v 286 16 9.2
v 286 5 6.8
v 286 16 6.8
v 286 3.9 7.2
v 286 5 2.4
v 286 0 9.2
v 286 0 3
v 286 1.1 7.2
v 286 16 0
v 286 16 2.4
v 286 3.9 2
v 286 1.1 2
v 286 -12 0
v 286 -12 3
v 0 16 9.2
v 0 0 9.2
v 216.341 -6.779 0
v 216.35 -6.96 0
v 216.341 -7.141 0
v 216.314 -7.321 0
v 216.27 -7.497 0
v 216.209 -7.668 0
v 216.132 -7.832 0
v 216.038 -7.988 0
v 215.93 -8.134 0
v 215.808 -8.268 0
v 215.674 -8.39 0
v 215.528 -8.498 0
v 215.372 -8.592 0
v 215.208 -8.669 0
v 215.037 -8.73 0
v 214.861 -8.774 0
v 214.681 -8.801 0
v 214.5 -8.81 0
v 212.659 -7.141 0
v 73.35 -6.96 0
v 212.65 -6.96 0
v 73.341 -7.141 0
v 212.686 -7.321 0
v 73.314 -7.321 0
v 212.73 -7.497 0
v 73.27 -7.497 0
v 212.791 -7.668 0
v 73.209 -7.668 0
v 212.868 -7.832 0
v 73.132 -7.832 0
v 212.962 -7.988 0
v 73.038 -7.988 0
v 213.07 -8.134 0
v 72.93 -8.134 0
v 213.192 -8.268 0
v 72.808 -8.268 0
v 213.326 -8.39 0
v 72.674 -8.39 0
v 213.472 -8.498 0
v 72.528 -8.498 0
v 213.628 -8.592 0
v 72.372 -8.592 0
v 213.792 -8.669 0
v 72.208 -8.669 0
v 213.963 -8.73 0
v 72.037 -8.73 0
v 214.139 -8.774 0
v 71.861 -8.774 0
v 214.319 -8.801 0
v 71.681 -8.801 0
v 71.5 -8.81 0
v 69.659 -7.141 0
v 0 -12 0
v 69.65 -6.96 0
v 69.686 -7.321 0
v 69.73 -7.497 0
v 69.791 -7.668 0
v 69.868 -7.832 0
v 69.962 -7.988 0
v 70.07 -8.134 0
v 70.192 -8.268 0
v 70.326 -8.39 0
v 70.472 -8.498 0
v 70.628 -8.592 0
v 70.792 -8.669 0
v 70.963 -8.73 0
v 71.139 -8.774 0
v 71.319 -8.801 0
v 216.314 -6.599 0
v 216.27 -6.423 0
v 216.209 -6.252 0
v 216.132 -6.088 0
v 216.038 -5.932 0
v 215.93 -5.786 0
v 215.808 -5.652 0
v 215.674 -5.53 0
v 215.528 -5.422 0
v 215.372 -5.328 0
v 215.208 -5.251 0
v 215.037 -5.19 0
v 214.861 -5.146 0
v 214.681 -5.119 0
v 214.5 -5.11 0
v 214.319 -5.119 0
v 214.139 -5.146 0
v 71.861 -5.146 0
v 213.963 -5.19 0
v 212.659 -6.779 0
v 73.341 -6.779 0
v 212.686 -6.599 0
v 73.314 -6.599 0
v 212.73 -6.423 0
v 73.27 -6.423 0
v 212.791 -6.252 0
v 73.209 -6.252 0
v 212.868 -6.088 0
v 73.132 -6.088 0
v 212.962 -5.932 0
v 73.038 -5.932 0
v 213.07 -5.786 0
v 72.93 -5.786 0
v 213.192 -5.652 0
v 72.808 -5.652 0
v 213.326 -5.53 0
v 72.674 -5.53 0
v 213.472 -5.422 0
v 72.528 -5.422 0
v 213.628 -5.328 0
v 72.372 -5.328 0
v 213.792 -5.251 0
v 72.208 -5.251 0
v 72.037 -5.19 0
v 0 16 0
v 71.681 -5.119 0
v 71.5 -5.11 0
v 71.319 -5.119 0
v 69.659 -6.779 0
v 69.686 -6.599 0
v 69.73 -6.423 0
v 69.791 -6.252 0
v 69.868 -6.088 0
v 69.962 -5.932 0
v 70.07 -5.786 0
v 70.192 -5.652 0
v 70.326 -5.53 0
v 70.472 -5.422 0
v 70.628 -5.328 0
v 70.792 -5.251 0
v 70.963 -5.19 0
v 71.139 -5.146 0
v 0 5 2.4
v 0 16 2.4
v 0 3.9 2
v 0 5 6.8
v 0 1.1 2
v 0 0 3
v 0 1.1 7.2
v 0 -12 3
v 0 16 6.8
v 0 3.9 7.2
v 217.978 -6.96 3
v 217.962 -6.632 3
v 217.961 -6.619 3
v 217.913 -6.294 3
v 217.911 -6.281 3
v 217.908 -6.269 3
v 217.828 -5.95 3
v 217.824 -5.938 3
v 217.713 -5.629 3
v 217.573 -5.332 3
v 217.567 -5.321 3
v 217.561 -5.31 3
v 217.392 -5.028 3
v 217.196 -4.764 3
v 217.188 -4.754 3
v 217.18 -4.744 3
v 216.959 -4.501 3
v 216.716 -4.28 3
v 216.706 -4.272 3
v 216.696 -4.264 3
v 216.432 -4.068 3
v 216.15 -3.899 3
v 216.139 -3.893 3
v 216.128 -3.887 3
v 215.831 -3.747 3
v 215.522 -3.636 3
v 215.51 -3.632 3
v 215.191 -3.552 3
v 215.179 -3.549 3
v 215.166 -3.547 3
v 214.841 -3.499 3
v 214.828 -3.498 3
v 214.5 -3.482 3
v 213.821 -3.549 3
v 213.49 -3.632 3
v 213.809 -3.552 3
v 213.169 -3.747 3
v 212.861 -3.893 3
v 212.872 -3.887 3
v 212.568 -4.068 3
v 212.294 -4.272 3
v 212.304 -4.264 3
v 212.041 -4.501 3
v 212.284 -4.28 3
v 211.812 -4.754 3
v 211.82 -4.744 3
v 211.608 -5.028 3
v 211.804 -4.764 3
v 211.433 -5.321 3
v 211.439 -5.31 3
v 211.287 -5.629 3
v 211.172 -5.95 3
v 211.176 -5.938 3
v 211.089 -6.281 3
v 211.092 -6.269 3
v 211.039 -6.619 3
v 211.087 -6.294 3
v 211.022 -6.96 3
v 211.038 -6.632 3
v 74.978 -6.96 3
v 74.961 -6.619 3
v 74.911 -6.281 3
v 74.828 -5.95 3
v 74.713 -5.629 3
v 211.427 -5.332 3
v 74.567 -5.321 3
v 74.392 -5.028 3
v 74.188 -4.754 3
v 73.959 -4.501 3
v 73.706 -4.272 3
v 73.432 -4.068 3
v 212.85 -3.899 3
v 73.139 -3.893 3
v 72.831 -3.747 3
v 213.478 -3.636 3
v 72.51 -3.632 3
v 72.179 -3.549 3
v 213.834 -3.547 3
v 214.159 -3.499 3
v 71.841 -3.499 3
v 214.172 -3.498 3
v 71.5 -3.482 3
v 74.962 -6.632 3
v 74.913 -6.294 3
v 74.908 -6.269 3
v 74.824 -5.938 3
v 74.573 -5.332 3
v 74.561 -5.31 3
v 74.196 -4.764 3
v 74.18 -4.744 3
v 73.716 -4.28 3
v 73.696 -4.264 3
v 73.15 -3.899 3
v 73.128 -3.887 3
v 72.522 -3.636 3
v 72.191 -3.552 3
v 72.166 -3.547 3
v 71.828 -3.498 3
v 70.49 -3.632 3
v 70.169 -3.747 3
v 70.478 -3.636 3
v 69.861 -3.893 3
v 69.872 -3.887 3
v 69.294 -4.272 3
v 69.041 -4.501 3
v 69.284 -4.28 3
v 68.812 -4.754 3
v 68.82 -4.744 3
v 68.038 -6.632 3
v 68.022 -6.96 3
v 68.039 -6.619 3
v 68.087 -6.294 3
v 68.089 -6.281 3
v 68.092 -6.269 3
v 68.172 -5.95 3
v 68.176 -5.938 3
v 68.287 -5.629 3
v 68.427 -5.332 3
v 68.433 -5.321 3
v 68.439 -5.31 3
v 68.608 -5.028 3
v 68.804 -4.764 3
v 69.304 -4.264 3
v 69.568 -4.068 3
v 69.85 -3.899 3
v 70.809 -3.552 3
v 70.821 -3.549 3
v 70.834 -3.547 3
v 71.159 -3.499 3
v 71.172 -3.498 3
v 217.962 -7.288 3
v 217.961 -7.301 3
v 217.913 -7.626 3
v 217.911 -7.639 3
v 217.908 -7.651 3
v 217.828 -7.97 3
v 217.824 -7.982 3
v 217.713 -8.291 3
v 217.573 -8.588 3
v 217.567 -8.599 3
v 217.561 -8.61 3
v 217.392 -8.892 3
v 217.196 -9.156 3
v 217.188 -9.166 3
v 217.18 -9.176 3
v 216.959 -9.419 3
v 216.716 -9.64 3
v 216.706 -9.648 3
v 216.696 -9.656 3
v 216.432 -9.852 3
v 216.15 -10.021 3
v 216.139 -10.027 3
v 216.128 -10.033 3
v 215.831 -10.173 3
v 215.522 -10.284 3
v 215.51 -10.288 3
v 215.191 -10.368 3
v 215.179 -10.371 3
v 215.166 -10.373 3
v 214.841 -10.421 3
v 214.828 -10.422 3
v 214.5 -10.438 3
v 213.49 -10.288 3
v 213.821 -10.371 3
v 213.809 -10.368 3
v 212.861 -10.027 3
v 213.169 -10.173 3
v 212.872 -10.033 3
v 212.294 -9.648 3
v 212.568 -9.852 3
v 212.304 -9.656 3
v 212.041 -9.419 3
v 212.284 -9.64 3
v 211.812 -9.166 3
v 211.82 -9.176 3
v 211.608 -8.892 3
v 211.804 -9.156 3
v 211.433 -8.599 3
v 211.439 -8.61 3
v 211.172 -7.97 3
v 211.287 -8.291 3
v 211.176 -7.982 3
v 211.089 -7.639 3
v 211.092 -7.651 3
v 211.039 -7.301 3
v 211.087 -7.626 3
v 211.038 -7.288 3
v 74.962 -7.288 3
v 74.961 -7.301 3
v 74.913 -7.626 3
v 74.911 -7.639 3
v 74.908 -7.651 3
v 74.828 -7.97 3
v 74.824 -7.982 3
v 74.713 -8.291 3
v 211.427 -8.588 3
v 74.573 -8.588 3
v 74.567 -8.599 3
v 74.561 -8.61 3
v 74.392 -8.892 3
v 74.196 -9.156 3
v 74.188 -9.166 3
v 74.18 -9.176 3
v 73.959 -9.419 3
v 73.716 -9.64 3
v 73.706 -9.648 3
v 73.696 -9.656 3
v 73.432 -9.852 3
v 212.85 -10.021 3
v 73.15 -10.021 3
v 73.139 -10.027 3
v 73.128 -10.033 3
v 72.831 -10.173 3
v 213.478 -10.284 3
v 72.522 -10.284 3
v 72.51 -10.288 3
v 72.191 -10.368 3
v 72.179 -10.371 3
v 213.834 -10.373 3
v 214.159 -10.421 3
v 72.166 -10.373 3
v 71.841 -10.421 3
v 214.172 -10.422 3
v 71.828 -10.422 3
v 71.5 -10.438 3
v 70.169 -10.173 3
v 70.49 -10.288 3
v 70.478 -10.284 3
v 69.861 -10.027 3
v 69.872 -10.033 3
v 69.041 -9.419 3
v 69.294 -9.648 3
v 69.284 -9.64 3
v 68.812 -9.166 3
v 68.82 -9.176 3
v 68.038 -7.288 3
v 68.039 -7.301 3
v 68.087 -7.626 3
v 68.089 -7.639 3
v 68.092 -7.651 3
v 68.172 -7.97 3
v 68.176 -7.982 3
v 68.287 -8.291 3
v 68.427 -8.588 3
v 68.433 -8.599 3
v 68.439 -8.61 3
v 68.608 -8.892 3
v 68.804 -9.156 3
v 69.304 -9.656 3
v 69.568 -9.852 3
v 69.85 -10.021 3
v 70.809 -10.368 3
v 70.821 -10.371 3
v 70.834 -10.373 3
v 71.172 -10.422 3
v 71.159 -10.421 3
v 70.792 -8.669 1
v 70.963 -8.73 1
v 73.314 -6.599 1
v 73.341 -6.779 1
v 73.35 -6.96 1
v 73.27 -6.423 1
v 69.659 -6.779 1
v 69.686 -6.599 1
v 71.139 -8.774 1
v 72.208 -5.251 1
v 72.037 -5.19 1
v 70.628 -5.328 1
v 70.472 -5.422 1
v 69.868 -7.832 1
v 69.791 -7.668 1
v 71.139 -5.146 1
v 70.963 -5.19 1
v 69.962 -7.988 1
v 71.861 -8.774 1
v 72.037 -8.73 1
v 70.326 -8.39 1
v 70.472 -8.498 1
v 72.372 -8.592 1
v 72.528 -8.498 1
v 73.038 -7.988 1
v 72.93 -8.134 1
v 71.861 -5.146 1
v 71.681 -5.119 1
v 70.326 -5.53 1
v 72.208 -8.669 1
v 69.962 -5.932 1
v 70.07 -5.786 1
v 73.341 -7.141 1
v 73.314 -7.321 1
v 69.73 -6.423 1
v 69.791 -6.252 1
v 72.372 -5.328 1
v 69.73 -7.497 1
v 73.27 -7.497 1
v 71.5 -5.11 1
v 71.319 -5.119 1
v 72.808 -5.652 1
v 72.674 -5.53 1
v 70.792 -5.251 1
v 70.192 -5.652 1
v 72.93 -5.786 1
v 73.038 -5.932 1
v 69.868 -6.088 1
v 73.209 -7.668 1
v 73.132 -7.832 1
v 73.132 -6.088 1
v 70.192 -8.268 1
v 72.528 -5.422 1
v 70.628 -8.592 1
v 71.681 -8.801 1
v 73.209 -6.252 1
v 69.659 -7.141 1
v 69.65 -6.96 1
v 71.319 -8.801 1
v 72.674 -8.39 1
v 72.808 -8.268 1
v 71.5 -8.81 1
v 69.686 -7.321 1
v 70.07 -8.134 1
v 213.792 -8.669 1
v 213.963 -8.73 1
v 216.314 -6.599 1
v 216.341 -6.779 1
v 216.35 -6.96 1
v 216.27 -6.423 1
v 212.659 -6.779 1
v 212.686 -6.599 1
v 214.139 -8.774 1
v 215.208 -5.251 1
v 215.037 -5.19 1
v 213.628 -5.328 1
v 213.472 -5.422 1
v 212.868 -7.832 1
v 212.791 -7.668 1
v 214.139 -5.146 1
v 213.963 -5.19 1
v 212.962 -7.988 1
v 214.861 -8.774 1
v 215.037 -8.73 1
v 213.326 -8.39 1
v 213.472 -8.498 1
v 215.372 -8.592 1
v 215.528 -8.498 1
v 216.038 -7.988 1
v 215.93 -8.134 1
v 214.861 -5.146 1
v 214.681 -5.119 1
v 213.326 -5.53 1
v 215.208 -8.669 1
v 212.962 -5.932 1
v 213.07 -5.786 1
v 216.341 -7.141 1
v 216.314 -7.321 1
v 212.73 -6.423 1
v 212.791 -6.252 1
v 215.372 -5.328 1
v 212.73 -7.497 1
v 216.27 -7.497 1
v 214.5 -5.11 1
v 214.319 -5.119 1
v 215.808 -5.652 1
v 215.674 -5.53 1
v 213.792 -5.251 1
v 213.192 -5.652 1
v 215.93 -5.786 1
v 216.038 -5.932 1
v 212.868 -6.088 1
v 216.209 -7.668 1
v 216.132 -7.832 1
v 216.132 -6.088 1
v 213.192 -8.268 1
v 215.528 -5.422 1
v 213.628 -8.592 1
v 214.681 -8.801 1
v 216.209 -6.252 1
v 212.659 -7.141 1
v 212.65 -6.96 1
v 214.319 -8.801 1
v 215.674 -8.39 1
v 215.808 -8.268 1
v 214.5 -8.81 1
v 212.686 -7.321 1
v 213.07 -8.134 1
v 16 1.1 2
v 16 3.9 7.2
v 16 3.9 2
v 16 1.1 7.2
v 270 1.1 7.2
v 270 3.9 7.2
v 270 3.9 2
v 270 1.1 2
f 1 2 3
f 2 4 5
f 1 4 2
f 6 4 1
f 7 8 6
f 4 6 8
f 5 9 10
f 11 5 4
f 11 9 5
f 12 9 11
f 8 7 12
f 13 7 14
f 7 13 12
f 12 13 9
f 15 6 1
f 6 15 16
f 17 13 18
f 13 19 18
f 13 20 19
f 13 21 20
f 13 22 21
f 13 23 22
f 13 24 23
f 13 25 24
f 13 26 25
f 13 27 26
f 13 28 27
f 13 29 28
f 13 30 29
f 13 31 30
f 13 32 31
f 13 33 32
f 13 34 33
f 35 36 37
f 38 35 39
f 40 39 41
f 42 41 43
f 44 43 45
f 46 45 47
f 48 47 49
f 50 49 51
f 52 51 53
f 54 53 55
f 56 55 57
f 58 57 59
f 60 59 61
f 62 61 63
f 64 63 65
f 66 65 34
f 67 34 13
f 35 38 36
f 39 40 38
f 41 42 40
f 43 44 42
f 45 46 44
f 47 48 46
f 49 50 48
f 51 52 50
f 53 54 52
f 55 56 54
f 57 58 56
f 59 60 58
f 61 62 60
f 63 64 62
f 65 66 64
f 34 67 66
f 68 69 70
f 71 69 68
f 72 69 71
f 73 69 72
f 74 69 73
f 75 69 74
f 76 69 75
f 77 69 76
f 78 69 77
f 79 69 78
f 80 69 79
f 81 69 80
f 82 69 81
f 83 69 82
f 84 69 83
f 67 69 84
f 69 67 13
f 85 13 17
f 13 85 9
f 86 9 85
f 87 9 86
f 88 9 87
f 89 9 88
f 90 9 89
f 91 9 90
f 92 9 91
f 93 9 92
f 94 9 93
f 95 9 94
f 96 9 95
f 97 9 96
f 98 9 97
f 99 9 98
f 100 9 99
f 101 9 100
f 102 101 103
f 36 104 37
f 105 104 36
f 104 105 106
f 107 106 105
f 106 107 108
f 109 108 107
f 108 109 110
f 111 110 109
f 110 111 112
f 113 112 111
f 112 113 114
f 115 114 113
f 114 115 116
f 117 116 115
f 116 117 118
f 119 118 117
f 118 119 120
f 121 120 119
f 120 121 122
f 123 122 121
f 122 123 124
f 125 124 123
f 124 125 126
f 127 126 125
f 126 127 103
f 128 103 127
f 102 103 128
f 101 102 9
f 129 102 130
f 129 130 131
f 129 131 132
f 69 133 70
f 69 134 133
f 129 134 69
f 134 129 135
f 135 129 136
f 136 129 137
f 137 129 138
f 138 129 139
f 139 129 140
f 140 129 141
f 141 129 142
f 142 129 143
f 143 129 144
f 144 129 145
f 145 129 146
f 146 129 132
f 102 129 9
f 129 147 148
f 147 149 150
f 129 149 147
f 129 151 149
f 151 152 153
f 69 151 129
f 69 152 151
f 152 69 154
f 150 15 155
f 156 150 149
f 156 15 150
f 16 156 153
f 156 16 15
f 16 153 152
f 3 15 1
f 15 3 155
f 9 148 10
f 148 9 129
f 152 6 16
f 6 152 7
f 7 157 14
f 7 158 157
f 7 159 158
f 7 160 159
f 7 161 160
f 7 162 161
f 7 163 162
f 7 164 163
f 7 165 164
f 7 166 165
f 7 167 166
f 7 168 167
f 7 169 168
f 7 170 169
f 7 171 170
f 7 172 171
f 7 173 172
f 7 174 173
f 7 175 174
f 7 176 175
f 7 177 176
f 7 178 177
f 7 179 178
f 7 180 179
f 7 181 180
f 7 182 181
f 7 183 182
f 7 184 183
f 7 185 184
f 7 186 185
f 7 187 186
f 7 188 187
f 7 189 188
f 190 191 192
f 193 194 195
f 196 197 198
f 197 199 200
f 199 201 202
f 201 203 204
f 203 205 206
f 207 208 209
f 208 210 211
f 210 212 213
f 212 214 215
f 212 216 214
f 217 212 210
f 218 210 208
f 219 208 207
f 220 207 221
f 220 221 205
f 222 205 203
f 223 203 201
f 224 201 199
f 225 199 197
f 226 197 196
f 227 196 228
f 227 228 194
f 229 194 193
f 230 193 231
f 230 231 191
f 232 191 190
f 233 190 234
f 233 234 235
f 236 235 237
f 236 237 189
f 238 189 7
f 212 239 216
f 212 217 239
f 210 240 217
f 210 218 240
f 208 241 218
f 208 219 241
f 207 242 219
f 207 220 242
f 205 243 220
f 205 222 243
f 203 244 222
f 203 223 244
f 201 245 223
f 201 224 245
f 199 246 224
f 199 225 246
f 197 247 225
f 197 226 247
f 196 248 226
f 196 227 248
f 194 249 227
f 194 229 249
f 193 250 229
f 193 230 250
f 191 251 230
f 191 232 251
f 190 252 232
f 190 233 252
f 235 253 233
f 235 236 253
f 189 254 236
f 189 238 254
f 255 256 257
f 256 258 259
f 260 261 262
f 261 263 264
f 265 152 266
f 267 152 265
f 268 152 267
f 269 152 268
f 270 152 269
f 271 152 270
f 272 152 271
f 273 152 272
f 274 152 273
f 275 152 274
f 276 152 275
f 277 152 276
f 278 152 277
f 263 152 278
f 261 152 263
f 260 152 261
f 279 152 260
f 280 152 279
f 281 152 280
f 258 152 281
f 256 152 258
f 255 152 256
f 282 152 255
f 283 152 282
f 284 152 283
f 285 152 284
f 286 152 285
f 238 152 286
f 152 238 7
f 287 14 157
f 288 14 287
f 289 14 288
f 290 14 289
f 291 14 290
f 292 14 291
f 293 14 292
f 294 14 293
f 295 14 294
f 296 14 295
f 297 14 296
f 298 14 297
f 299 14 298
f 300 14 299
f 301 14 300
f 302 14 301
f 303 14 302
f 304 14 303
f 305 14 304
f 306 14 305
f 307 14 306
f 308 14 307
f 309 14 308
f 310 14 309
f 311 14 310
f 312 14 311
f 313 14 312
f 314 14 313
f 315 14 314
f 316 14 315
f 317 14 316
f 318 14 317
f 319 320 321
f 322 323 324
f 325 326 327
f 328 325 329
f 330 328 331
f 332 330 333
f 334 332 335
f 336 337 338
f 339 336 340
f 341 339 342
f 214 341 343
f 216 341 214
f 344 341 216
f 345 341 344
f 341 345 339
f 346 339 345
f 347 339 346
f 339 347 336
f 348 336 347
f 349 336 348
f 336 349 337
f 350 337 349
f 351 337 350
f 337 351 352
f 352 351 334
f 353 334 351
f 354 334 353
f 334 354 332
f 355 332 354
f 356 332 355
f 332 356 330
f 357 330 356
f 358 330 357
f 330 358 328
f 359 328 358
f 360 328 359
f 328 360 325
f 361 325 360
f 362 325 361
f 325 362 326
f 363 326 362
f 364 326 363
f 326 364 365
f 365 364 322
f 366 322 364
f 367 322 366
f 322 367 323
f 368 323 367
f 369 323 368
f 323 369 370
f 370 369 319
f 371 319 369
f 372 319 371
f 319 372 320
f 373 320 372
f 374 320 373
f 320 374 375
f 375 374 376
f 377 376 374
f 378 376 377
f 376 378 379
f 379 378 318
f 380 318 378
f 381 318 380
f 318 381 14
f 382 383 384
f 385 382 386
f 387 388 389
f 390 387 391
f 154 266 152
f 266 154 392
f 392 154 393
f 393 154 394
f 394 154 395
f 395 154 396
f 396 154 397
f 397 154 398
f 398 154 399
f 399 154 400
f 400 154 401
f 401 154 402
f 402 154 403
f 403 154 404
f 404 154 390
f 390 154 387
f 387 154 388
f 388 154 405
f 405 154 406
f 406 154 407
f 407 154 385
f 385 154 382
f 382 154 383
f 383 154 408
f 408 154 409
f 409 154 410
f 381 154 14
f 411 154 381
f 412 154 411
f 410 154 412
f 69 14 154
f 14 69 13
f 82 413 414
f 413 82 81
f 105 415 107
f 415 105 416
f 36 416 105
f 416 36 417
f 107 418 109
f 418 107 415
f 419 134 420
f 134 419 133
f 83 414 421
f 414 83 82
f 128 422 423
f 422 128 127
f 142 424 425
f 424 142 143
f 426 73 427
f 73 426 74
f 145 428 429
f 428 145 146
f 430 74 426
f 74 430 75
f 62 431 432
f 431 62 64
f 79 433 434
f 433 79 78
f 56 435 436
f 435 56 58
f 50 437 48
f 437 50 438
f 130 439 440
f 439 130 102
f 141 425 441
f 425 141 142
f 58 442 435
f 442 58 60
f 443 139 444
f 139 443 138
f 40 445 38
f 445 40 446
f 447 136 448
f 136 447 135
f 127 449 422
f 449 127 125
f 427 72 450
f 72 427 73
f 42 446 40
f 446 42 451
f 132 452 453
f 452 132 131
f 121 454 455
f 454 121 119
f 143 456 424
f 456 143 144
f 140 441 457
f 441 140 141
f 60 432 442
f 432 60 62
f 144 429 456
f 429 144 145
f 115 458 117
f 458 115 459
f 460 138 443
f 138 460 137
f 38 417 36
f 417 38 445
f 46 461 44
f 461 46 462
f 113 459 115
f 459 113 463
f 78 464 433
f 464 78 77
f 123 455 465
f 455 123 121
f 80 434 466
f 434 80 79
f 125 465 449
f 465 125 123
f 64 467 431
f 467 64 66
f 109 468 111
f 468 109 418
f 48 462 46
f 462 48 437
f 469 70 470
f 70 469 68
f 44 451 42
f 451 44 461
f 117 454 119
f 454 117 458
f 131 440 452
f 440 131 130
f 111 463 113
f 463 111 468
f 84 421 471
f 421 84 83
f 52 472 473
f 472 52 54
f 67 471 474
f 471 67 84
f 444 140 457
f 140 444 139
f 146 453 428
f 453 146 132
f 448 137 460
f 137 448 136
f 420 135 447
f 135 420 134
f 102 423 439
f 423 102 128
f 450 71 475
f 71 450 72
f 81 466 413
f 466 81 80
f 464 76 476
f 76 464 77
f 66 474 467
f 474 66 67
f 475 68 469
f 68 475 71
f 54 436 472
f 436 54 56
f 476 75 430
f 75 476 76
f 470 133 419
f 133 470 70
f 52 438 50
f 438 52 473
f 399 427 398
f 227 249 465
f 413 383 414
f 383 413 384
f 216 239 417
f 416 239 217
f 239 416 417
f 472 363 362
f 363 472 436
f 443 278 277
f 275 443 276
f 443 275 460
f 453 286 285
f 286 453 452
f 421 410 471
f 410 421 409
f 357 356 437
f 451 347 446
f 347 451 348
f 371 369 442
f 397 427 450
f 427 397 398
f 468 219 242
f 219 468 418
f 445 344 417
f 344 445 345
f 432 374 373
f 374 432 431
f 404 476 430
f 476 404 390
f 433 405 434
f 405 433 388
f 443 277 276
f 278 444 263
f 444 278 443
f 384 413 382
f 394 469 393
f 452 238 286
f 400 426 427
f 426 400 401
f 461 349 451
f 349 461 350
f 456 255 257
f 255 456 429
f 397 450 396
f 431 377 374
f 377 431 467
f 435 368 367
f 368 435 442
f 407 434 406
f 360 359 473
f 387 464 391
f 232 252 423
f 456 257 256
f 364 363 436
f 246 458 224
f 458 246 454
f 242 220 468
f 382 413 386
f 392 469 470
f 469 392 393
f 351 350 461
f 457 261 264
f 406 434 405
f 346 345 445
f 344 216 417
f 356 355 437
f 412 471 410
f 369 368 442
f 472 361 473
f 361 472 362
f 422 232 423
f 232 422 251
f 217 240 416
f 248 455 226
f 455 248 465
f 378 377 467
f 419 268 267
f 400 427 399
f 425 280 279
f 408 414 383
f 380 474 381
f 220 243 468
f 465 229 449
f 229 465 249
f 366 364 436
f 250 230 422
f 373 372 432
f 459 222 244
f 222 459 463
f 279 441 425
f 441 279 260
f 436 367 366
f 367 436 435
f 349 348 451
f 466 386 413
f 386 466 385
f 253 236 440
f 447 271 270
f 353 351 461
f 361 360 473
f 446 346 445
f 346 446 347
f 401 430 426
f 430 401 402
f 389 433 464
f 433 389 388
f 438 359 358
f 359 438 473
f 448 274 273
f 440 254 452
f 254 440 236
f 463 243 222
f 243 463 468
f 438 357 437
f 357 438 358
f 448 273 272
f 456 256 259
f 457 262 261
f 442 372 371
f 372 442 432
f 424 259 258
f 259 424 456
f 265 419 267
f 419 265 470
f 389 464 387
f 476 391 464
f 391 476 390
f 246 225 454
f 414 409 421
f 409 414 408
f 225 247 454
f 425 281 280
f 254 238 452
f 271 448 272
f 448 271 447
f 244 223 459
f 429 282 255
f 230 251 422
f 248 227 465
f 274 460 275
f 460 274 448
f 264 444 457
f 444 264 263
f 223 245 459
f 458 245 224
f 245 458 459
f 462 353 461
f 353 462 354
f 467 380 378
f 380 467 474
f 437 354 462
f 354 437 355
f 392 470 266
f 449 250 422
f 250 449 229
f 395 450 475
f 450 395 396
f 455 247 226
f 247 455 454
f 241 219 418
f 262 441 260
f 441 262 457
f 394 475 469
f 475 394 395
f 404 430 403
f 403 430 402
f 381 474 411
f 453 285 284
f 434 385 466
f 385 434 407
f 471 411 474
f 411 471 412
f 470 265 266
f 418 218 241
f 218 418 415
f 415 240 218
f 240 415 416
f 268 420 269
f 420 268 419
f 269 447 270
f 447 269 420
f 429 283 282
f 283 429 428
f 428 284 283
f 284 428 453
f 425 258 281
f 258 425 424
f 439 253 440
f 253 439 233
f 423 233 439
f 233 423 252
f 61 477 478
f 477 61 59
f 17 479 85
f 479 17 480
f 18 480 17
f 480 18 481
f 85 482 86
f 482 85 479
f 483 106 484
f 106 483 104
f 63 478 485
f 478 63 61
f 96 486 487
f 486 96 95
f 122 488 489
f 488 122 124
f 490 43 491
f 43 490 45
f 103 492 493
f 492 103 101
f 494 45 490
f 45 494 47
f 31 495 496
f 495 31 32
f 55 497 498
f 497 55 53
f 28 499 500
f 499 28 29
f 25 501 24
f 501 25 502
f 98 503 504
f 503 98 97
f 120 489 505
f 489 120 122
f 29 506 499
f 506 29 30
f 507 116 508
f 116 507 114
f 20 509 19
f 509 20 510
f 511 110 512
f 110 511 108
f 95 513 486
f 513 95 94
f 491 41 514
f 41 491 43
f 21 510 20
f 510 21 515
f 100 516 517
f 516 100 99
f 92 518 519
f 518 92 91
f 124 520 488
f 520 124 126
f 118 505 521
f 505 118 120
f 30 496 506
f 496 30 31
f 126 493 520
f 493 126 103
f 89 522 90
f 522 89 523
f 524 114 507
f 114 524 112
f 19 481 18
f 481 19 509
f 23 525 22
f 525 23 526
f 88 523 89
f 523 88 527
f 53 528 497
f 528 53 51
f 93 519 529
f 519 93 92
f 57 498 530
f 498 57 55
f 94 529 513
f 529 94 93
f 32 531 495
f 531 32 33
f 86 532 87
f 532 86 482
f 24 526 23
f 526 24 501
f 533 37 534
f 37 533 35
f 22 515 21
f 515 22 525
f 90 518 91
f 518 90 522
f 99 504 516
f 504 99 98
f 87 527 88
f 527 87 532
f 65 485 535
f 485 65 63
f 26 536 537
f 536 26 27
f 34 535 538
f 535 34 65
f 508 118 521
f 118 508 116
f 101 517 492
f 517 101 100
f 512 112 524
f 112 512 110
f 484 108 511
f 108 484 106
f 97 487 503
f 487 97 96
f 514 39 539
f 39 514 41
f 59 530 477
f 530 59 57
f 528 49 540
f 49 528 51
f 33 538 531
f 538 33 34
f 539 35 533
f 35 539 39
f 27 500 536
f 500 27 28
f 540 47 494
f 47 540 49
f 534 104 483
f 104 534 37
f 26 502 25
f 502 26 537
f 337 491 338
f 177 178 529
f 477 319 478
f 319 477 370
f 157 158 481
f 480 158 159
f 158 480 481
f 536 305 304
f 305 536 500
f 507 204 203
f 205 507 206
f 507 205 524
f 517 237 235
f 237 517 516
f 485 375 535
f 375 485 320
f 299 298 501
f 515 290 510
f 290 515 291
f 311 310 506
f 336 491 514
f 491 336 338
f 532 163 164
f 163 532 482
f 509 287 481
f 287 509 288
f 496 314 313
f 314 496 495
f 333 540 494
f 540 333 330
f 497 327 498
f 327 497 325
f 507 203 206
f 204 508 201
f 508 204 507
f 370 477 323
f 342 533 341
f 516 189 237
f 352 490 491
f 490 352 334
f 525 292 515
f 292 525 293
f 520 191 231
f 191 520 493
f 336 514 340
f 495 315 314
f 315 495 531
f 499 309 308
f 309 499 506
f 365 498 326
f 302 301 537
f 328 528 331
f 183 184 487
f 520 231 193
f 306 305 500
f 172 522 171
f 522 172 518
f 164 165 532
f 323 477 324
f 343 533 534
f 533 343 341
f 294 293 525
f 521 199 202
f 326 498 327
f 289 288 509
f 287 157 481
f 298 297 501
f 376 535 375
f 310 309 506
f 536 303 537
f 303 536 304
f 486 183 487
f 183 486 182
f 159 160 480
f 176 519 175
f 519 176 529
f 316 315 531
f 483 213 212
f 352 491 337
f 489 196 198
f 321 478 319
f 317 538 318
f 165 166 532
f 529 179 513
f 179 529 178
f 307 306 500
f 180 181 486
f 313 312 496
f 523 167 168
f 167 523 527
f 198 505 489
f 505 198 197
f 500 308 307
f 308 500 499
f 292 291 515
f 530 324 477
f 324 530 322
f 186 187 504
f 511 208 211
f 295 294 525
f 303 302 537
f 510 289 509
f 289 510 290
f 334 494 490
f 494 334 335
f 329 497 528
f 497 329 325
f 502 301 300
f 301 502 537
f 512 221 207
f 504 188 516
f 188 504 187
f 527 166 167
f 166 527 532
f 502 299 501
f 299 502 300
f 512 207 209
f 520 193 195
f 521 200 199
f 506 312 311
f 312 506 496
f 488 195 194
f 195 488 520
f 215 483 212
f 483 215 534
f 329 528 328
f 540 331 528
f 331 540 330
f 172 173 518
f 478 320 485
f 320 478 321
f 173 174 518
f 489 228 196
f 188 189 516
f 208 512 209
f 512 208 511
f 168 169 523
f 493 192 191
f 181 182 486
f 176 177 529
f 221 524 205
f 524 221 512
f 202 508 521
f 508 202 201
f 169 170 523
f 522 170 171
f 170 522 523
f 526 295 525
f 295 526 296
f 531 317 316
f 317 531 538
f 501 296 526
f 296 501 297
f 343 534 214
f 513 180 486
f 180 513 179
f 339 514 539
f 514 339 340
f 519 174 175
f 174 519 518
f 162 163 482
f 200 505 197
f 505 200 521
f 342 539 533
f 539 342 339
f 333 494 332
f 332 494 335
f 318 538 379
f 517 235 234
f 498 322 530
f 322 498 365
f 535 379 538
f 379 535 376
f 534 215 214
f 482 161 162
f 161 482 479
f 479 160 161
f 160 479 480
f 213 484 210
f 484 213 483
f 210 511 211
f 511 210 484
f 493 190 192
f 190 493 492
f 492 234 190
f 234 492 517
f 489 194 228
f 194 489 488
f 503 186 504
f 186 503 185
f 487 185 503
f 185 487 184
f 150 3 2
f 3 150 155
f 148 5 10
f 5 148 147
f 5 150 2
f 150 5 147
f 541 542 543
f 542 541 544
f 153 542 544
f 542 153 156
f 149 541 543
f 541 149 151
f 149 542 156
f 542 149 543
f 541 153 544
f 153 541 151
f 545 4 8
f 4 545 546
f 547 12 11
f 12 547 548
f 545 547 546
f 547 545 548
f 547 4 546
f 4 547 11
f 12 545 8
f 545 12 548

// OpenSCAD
/*
 Anycubic Kobra 3 Max – parametric camera-whitebox enclosure hardware
 Hybrid construction: 20x20 mm timber battens, white hardboard and sheet goods.
 Default outer dimensions: 900 x 1050 x 900 mm (W x D x H).
 The camera parts are an independent reconstruction from documented interface
 dimensions. No supplier or legacy mesh is imported by this source.
 License: CC BY 4.0.
*/

PART = is_undef(PART) ? "rail_286" : PART;
ENC_W = is_undef(ENC_W) ? 900 : ENC_W;
ENC_D = is_undef(ENC_D) ? 1050 : ENC_D;
ENC_H = is_undef(ENC_H) ? 900 : ENC_H;
BATTEN = is_undef(BATTEN) ? 20 : BATTEN;
GLASS = is_undef(GLASS) ? 4.0 : GLASS;
GLASS_CLEARANCE = is_undef(GLASS_CLEARANCE) ? 0.40 : GLASS_CLEARANCE;
CAMERA_RAIL_W = is_undef(CAMERA_RAIL_W) ? 20.0 : CAMERA_RAIL_W;
CAMERA_ARM_EYE_T = is_undef(CAMERA_ARM_EYE_T) ? 6.0 : CAMERA_ARM_EYE_T;
CAMERA_HINGE_CLEARANCE = is_undef(CAMERA_HINGE_CLEARANCE) ? 0.65 : CAMERA_HINGE_CLEARANCE;
CAMERA_HINGE_D = is_undef(CAMERA_HINGE_D) ? 4.5 : CAMERA_HINGE_D;
BAFFLE_DEPTH = is_undef(BAFFLE_DEPTH) ? 60.0 : BAFFLE_DEPTH;
CAMERA_FACE_W = is_undef(CAMERA_FACE_W) ? 22.50 : CAMERA_FACE_W;
CAMERA_FACE_H = is_undef(CAMERA_FACE_H) ? 38.50 : CAMERA_FACE_H;
CAMERA_REFERENCE_FULL_H = is_undef(CAMERA_REFERENCE_FULL_H) ? 43.50 : CAMERA_REFERENCE_FULL_H;
CAMERA_REFERENCE_DEPTH = is_undef(CAMERA_REFERENCE_DEPTH) ? 25.00 : CAMERA_REFERENCE_DEPTH;
CAMERA_PROTECTED_DEPTH = is_undef(CAMERA_PROTECTED_DEPTH) ? 25.30 : CAMERA_PROTECTED_DEPTH;
CAMERA_FIT_CLEARANCE = is_undef(CAMERA_FIT_CLEARANCE) ? 0.30 : CAMERA_FIT_CLEARANCE;
CAMERA_LENS_D = is_undef(CAMERA_LENS_D) ? 14.30 : CAMERA_LENS_D;
CAMERA_LED_D = is_undef(CAMERA_LED_D) ? 5.50 : CAMERA_LED_D;
CAMERA_BALL_D = is_undef(CAMERA_BALL_D) ? 11.00 : CAMERA_BALL_D;
CAMERA_BALL_CLEARANCE = is_undef(CAMERA_BALL_CLEARANCE) ? 0.28 : CAMERA_BALL_CLEARANCE;
CAMERA_WINDOW_W = is_undef(CAMERA_WINDOW_W) ? 80.0 : CAMERA_WINDOW_W;
CAMERA_WINDOW_H = is_undef(CAMERA_WINDOW_H) ? 90.0 : CAMERA_WINDOW_H;
CAMERA_WINDOW_TILT = is_undef(CAMERA_WINDOW_TILT) ? 7.0 : CAMERA_WINDOW_TILT;

RAIL_REACH = 16.0;
RAIL_BACK = 5.0;
RAIL_SLOT_DEPTH = RAIL_REACH - RAIL_BACK;
RAIL_WALL = 2.4;
RAIL_T = GLASS + GLASS_CLEARANCE + 2*RAIL_WALL;
RAIL_FLANGE = 12.0;
RAIL_FLANGE_T = 3.0;
PIN_CAVITY_W = 2.8;
PIN_CAVITY_H = 5.2;
PIN_DEPTH = 16.0;
EPS = 0.05;
$fn = 64;

module screw_hole_z(d=4.2,h=10) { translate([0,0,-EPS]) cylinder(d=d,h=h+2*EPS); }
module screw_hole_x(d=4.2,h=10) { rotate([0,90,0]) translate([0,0,-EPS]) cylinder(d=d,h=h+2*EPS); }
module screw_hole_y(d=4.2,h=10) { rotate([-90,0,0]) translate([0,0,-EPS]) cylinder(d=d,h=h+2*EPS); }

module capsule(length=44,width=16,height=5) {
  linear_extrude(height=height)
    hull() {
      translate([width/2,width/2]) circle(d=width);
      translate([length-width/2,width/2]) circle(d=width);
    }
}

module rounded_prism(size=[20,20,4],r=3) {
  assert(size[0]>2*r && size[1]>2*r && size[2]>0,
    "Rounded-prism dimensions must exceed twice the corner radius");
  linear_extrude(height=size[2])
    hull()
      for (x=[r,size[0]-r],y=[r,size[1]-r])
        translate([x,y]) circle(r=r,$fn=32);
}

// U-channel for an acrylic edge, screwed to a flat timber face.
// Print flat on the mounting flange. The acrylic slot opens toward +Y.
module acrylic_rail(length=286,holes=true) {
  difference() {
    union() {
      cube([length,RAIL_REACH,RAIL_T]);
      translate([0,-RAIL_FLANGE,0]) cube([length,RAIL_FLANGE+4,RAIL_FLANGE_T]);
    }
    translate([-EPS,RAIL_BACK,RAIL_WALL])
      cube([length+2*EPS,RAIL_SLOT_DEPTH+EPS,GLASS+GLASS_CLEARANCE]);

    // Short alignment cavities at both ends; no long unsupported tunnel.
    translate([-EPS,1.1,(RAIL_T-PIN_CAVITY_H)/2])
      cube([PIN_DEPTH+EPS,PIN_CAVITY_W,PIN_CAVITY_H]);
    translate([length-PIN_DEPTH,1.1,(RAIL_T-PIN_CAVITY_H)/2])
      cube([PIN_DEPTH+EPS,PIN_CAVITY_W,PIN_CAVITY_H]);

    if (holes) for (x=[length*0.25,length*0.75]) {
      translate([x,-RAIL_FLANGE*0.58,-EPS]) cylinder(d=3.7,h=RAIL_FLANGE_T+2*EPS);
      translate([x,-RAIL_FLANGE*0.58,1.0])
        cylinder(d1=3.7,d2=7.2,h=RAIL_FLANGE_T-0.9+EPS);
    }
  }
}

module rail_splice_pin(length=30) {
  pin_w=PIN_CAVITY_W-0.25;
  pin_h=PIN_CAVITY_H-0.25;
  hull() {
    translate([1.2,0,0]) cube([length-2.4,pin_w,pin_h]);
    translate([0.3,0.25,0.25]) cube([length-0.6,pin_w-0.5,pin_h-0.5]);
  }
}

module rail_end_stop() {
  union() {
    cube([2,RAIL_REACH,RAIL_T]);
    translate([2,1.225,(RAIL_T-(PIN_CAVITY_H-0.25))/2])
      cube([12,PIN_CAVITY_W-0.25,PIN_CAVITY_H-0.25]);
  }
}

// Exterior 3-way timber corner bracket; one geometry works at all 8 corners by rotation.
module corner_gusset_3way(size=55,t=4) {
  difference() {
    union() {
      cube([size,size,t]);
      cube([size,t,size]);
      cube([t,size,size]);
      cube([12,12,12]);
    }
    for (p=[[16,34],[34,16],[40,40]]) translate([p[0],p[1],0]) screw_hole_z(4.3,t);
    for (p=[[16,34],[34,16],[40,40]]) translate([p[0],0,p[1]]) screw_hole_y(4.3,t);
    for (p=[[16,34],[34,16],[40,40]]) translate([0,p[0],p[1]]) screw_hole_x(4.3,t);
  }
}

module flat_t_bracket(t=4) {
  difference() {
    linear_extrude(height=t) union() {
      translate([0,18]) square([100,24]);
      translate([38,0]) square([24,60]);
    }
    for (p=[[15,30],[30,30],[70,30],[85,30],[50,10],[50,50]])
      translate([p[0],p[1],0]) screw_hole_z(4.3,t);
  }
}

module base_anchor(t=4) {
  difference() {
    union() { cube([45,28,t]); cube([45,t,28]); cube([8,8,8]); }
    for (x=[12,33]) translate([x,15,0]) screw_hole_z(4.3,t);
    for (x=[12,33]) translate([x,0,15]) screw_hole_y(4.3,t);
  }
}

module turn_clip() {
  difference() {
    union() { capsule(44,16,5); translate([34,3,5]) cube([8,10,1.2]); }
    translate([8,8,0]) screw_hole_z(4.4,7);
  }
}

module turn_clip_spacer() {
  difference() { cylinder(d=15,h=5); translate([0,0,-EPS]) cylinder(d=4.4,h=5+2*EPS); }
}

module panel_knob() {
  difference() {
    union() {
      cylinder(d=28,h=4);
      translate([0,0,4]) cylinder(d1=16,d2=13,h=15);
      translate([0,0,19]) cylinder(d=32,h=8);
    }
    translate([0,0,-EPS]) cylinder(d=4.4,h=28+2*EPS);
    translate([0,0,22]) cylinder(d=8.2,h=6.2);
  }
}

module panel_retainer_clip() {
  difference() {
    union() { cube([30,18,4]); translate([20,0,4]) cube([10,18,GLASS+1]); }
    translate([8,9,0]) screw_hole_z(4.3,4);
  }
}


module front_panel_shelf() {
  // Support ledge for the heavy removable front acrylic panel.
  // Print with the shelf on the bed; install the tall plate against the lower front timber.
  difference() {
    union() {
      cube([50,14,4]);          // horizontal shelf
      cube([50,4,30]);          // mounting plate
      translate([0,11,0]) cube([50,3,9]); // retaining lip
    }
    for (x=[13,37])
      translate([x,0,19]) screw_hole_y(4.3,4);
  }
}

module service_panel_120_ports() {
  pw=280; ph=200; pt=3; cw=250; ch=170; lt=3; lw=3; fx=82; fy=100;
  difference() {
    union() {
      cube([pw,ph,pt]);
      translate([(pw-cw)/2,(ph-ch)/2,pt])
        difference() {
          cube([cw-0.6,ch-0.6,lt]);
          translate([lw,lw,-EPS]) cube([cw-0.6-2*lw,ch-0.6-2*lw,lt+2*EPS]);
        }
    }
    translate([fx,fy,-EPS]) cylinder(d=114,h=pt+lt+2*EPS,$fn=128);
    for (dx=[-52.5,52.5],dy=[-52.5,52.5])
      translate([fx+dx,fy+dy,-EPS]) cylinder(d=4.5,h=pt+lt+2*EPS);
    for (p=[[190,145],[225,145]])
      translate([p[0],p[1],-EPS]) cylinder(d=10.2,h=pt+lt+2*EPS);
    translate([255,145,-EPS]) cylinder(d=20.5,h=pt+lt+2*EPS);
    translate([210,60,-EPS]) cylinder(d=38,h=pt+lt+2*EPS,$fn=96);
    translate([255,70,-EPS]) cylinder(d=6.5,h=pt+lt+2*EPS);
    for (p=[[10,10],[140,10],[270,10],[10,190],[140,190],[270,190],[10,100],[270,100]])
      translate([p[0],p[1],-EPS]) cylinder(d=4.3,h=pt+lt+2*EPS);
  }
}

module service_panel_blank() {
  pw=280; ph=200; pt=3; cw=250; ch=170; lt=3; lw=3;
  difference() {
    union() {
      cube([pw,ph,pt]);
      translate([(pw-cw)/2,(ph-ch)/2,pt])
        difference() {
          cube([cw-0.6,ch-0.6,lt]);
          translate([lw,lw,-EPS]) cube([cw-0.6-2*lw,ch-0.6-2*lw,lt+2*EPS]);
        }
    }
    for (p=[[10,10],[140,10],[270,10],[10,190],[140,190],[270,190],[10,100],[270,100]])
      translate([p[0],p[1],-EPS]) cylinder(d=4.3,h=pt+lt+2*EPS);
  }
}

module fan_adapter_120_to_100() {
  flange=125; ft=3; cone_h=45; tube_h=30; wall=2.5;
  difference() {
    union() {
      translate([-flange/2,-flange/2,0]) cube([flange,flange,ft]);
      translate([0,0,ft]) cylinder(h=cone_h,d1=120,d2=100,$fn=128);
      translate([0,0,ft+cone_h]) cylinder(h=tube_h,d=100,$fn=128);
      translate([0,0,ft+cone_h+tube_h-8]) cylinder(h=2,d=102,$fn=128);
      translate([0,0,ft+cone_h+tube_h-3]) cylinder(h=2,d=102,$fn=128);
    }
    translate([0,0,-EPS]) cylinder(h=ft+EPS,d=114,$fn=128);
    translate([0,0,ft-EPS]) cylinder(h=cone_h+2*EPS,d1=114,d2=95,$fn=128);
    translate([0,0,ft+cone_h-EPS]) cylinder(h=tube_h+2*EPS,d=95,$fn=128);
    for (dx=[-52.5,52.5],dy=[-52.5,52.5])
      translate([dx,dy,-EPS]) cylinder(d=4.5,h=ft+2*EPS);
  }
}

module fan_guard_120() {
  t=3;
  difference() {
    union() {
      // Connected square perimeter with airflow bars.
      difference() { cube([120,120,t]); translate([6,6,-EPS]) cube([108,108,t+2*EPS]); }
      translate([6,57.8,0]) cube([108,4.4,t]);
      translate([57.8,6,0]) cube([4.4,108,t]);
      translate([20,20,0]) rotate([0,0,45]) cube([113,3.4,t]);
      translate([20,100,0]) rotate([0,0,-45]) cube([113,3.4,t]);
    }
    for (x=[7.5,112.5],y=[7.5,112.5]) translate([x,y,-EPS]) cylinder(d=4.5,h=t+2*EPS);
  }
}

module cable_grommet_half(side=1) {
  difference() {
    intersection() {
      union() { cylinder(d=46,h=3,$fn=96); translate([0,0,3]) cylinder(d=37.6,h=4,$fn=96); }
      if (side>0) translate([0,-30,-EPS]) cube([30,60,8]);
      else translate([-30,-30,-EPS]) cube([30,60,8]);
    }
    translate([0,0,-EPS]) cylinder(d=8.5,h=8.2,$fn=64);
  }
}

module rail_test_coupon() { acrylic_rail(50,false); }

// Sliding camera base for a purchased 20x20 T-slot extrusion. The fork accepts
// the independently designed short socket arm below; no legacy arm is needed.
// Print with the rounded mounting plate on the bed; no support is required.
module camera_2020_slider_fork() {
  plate_w=44;
  plate_h=90;
  plate_t=5;
  plate_r=4;
  ear_r=9;
  ear_t=3.0;
  fork_gap=CAMERA_ARM_EYE_T+CAMERA_HINGE_CLEARANCE;
  fork_cx=-4;
  fork_cy=plate_h/2;
  fork_cz=plate_t+ear_r;
  neck_x=12;

  assert(CAMERA_RAIL_W>=15 && CAMERA_RAIL_W<=30,
    "CAMERA_RAIL_W must suit a compact T-slot extrusion");
  assert(fork_gap>CAMERA_ARM_EYE_T,
    "Camera fork gap must exceed arm-eye thickness");
  assert(CAMERA_HINGE_D>=4.2 && CAMERA_HINGE_D<=5.0,
    "Camera hinge hole must suit M4 hardware");

  difference() {
    union() {
      linear_extrude(height=plate_t)
        hull()
          for (x=[plate_r,plate_w-plate_r], y=[plate_r,plate_h-plate_r])
            translate([x,y]) circle(r=plate_r,$fn=32);

      for (ear_y=[fork_cy-fork_gap/2-ear_t, fork_cy+fork_gap/2]) {
        translate([fork_cx,ear_y,plate_t])
          cube([neck_x-fork_cx,ear_t,ear_r]);
        translate([fork_cx,ear_y,fork_cz])
          rotate([-90,0,0]) cylinder(r=ear_r,h=ear_t,$fn=64);
      }
    }

    // Two M5 slots allow alignment on a single 2020-extrusion T-slot.
    for (slot_y=[23,67]) {
      hull()
        for (dy=[-6,6])
          translate([plate_w/2,slot_y+dy,-EPS])
            cylinder(d=5.6,h=plate_t+2*EPS,$fn=36);
      hull()
        for (dy=[-6,6])
          translate([plate_w/2,slot_y+dy,plate_t-2.2])
            cylinder(d=10.2,h=2.2+EPS,$fn=48);
    }

    translate([fork_cx,
               fork_cy-fork_gap/2-ear_t-EPS,
               fork_cz])
      rotate([-90,0,0])
        cylinder(d=CAMERA_HINGE_D,
                 h=fork_gap+2*ear_t+2*EPS,
                 $fn=40);
  }
}

// Corner locator for the removable roof-light cassette.
// Four copies constrain the cassette laterally; two metal latches or screws
// retain it vertically. Print on the flat base without support.
module roof_cassette_corner_locator() {
  s=46;
  base_t=4;
  wall_t=4;
  wall_h=18;
  difference() {
    union() {
      cube([s,s,base_t]);
      cube([s,wall_t,wall_h]);
      cube([wall_t,s,wall_h]);
      translate([wall_t,wall_t,base_t])
        linear_extrude(height=wall_h-base_t)
          polygon([[0,0],[12,0],[0,12]]);
    }
    for (p=[[17,28],[28,17]])
      translate([p[0],p[1],-EPS])
        cylinder(d=4.3,h=base_t+2*EPS,$fn=32);
  }
}

// Small process coupon for the existing camera-arm eye. Print this before the
// complete slider and verify free rotation plus M4 clamp friction.
module camera_fork_fit_coupon() {
  base_w=34;
  base_h=38;
  base_t=4;
  ear_r=9;
  ear_t=3.0;
  fork_gap=CAMERA_ARM_EYE_T+CAMERA_HINGE_CLEARANCE;
  fork_cx=base_w/2;
  fork_cy=base_h/2;
  fork_cz=base_t+ear_r;

  difference() {
    union() {
      cube([base_w,base_h,base_t]);
      for (ear_y=[fork_cy-fork_gap/2-ear_t, fork_cy+fork_gap/2]) {
        translate([fork_cx-ear_r,ear_y,base_t])
          cube([2*ear_r,ear_t,ear_r]);
        translate([fork_cx,ear_y,fork_cz])
          rotate([-90,0,0]) cylinder(r=ear_r,h=ear_t,$fn=64);
      }
    }
    translate([fork_cx,
               fork_cy-fork_gap/2-ear_t-EPS,
               fork_cz])
      rotate([-90,0,0])
        cylinder(d=CAMERA_HINGE_D,
                 h=fork_gap+2*ear_t+2*EPS,
                 $fn=40);
  }
}

// Matte-white sight baffle for the inside of the 120 mm exhaust opening.
// The fan remains behind the wall; air enters through the full-width bottom
// gap while the camera sees a continuous white face. Print face-down.
module exhaust_camera_baffle_120() {
  cover=170;
  face_t=2.6;
  wall_t=2.6;
  depth=BAFFLE_DEPTH;
  boss_d=11;
  hole_d=4.5;
  boss_offset=13;

  assert(depth>=45,
    "BAFFLE_DEPTH below 45 mm restricts the bottom inlet excessively");
  assert(cover>=150,
    "Baffle cover must conceal a 120 mm fan and mounting hardware");

  difference() {
    union() {
      cube([cover,cover,face_t]);
      translate([0,0,face_t]) cube([wall_t,cover,depth-face_t]);
      translate([cover-wall_t,0,face_t]) cube([wall_t,cover,depth-face_t]);
      translate([0,cover-wall_t,face_t]) cube([cover,wall_t,depth-face_t]);

      // Through-bolt standoffs connect the face to the wall panel.
      for (x=[boss_offset,cover-boss_offset],
           y=[boss_offset,cover-boss_offset])
        translate([x,y,0]) cylinder(d=boss_d,h=depth,$fn=48);
    }

    for (x=[boss_offset,cover-boss_offset],
         y=[boss_offset,cover-boss_offset])
      translate([x,y,-EPS])
        cylinder(d=hole_d,h=depth+2*EPS,$fn=36);
  }
}

// Shallow ring that verifies the real camera face/body fit before the complete
// shell is printed. Nominal cavity: 22.50 x 38.50 mm plus 0.30 mm per side.
module camera_fit_frame_coupon() {
  cw=CAMERA_FACE_W+2*CAMERA_FIT_CLEARANCE;
  ch=CAMERA_FACE_H+2*CAMERA_FIT_CLEARANCE;
  wall=3.0;
  difference() {
    rounded_prism([cw+2*wall,ch+2*wall,4],2.2);
    translate([wall,wall,-EPS]) cube([cw,ch,4+2*EPS]);
  }
}

// Front shell for the original Anycubic Live View camera module. The retained
// optical openings follow the official reference interface; the outer styling,
// fasteners and all remaining geometry are newly authored here.
module camera_front_shell() {
  ow=34;
  oh=50;
  depth=13.5;
  face_t=2.2;
  cw=CAMERA_FACE_W+2*CAMERA_FIT_CLEARANCE;
  ch=CAMERA_FACE_H+2*CAMERA_FIT_CLEARANCE;
  lens_y=oh/2+5.57;
  led_y=oh/2-8.83;

  assert(CAMERA_FIT_CLEARANCE>=0.15 && CAMERA_FIT_CLEARANCE<=0.60,
    "Camera fit clearance must stay coupon-testable");
  assert(CAMERA_LENS_D>=14.0 && CAMERA_LENS_D<=15.0,
    "Camera lens opening is outside the documented interface range");

  difference() {
    rounded_prism([ow,oh,depth],3.0);
    translate([(ow-cw)/2,(oh-ch)/2,face_t])
      cube([cw,ch,depth-face_t+EPS]);
    translate([ow/2,lens_y,-EPS])
      cylinder(d=CAMERA_LENS_D+0.40,h=face_t+2*EPS,$fn=72);
    for (x=[ow/2-3.0,ow/2+3.0])
      translate([x,led_y,-EPS])
        cylinder(d=CAMERA_LED_D+0.40,h=face_t+2*EPS,$fn=48);

    // Two bounded M2.5 pilot holes for low-cost self-tapping case screws.
    for (x=[3.2,ow-3.2])
      translate([x,oh/2,depth-6]) cylinder(d=2.1,h=6+EPS,$fn=32);
  }
}

// Rear cap with an external overlap skirt, protected rear cavity, cable relief
// and integral 11 mm ball. Together with the 13.5 mm front shell it provides
// 25.3 mm protected depth (25.0 mm official reference extent + 0.3 mm).
// Print with the open mating side on the bed; the 24 mm roof bridge and ball
// grow between the two screw towers without generated support.
module camera_back_cover_ball() {
  shell_w=34;
  shell_h=50;
  skirt_clearance=0.25;
  skirt_wall=1.8;
  overlap_d=4.0;
  rear_inner_d=8.8;
  cap_t=3.0;
  cover_d=overlap_d+rear_inner_d+cap_t;
  ow=shell_w+2*(skirt_clearance+skirt_wall);
  oh=shell_h+2*(skirt_clearance+skirt_wall);
  shell_x=skirt_clearance+skirt_wall;
  shell_y=skirt_clearance+skirt_wall;
  rear_cavity_w=24.0;
  rear_cavity_h=40.2;
  ball_z=cover_d+6.0;

  assert(13.5+cover_d-overlap_d>=CAMERA_PROTECTED_DEPTH,
    "Front and rear shells do not provide the declared protected depth");
  assert(CAMERA_PROTECTED_DEPTH>=CAMERA_REFERENCE_DEPTH+0.20,
    "Protected depth needs at least 0.20 mm allowance over the reference");

  difference() {
    union() {
      difference() {
        rounded_prism([ow,oh,cover_d],3.5);
        // First section slips over the front shell.
        translate([shell_x,shell_y,-EPS])
          rounded_prism([shell_w+2*skirt_clearance,
                         shell_h+2*skirt_clearance,
                         overlap_d+EPS],2.9);
        // Rear cavity continues to the 3 mm protective cap.
        translate([(ow-rear_cavity_w)/2,(oh-rear_cavity_h)/2,
                   overlap_d-EPS])
          rounded_prism([rear_cavity_w,rear_cavity_h,
                         rear_inner_d+2*EPS],2.4);
      }

      // Long-screw towers bridge the rear cavity to the front-shell pilots.
      for (x=[shell_x+3.2,shell_x+shell_w-3.2])
        translate([x,shell_y+shell_h/2,overlap_d-EPS])
          cylinder(d=5.2,h=rear_inner_d+cap_t+EPS,$fn=40);

      translate([ow/2,oh/2,cover_d-EPS])
        cylinder(d=5.0,h=7.0,$fn=48);
      translate([ow/2,oh/2,ball_z]) sphere(d=CAMERA_BALL_D,$fn=72);
    }

    // Cable exits downward when the camera is installed.
    translate([ow/2-5,-EPS,-EPS])
      cube([10,(oh-rear_cavity_h)/2+2*EPS,cover_d-cap_t+EPS]);
    // M2.5 clearance holes align with the front-shell pilot holes.
    for (x=[shell_x+3.2,shell_x+shell_w-3.2])
      translate([x,shell_y+shell_h/2,-EPS])
        cylinder(d=2.8,h=cover_d+2*EPS,$fn=32);
    // Four rear ventilation slots remain outside the white-box interior.
    for (x=[ow/2-9,ow/2-5.5,ow/2+5.5,ow/2+9])
      translate([x-1,oh/2-9,cover_d-cap_t-EPS])
        cube([2,18,cap_t+2*EPS]);
  }
}

module camera_socket_body(clearance=CAMERA_BALL_CLEARANCE) {
  outer_d=20;
  body_h=13;
  cavity_d=CAMERA_BALL_D+2*clearance;
  cavity_z=7.5;
  entry_d=9.2;
  difference() {
    cylinder(d=outer_d,h=body_h,$fn=72);
    translate([0,0,cavity_z]) sphere(d=cavity_d,$fn=72);
    translate([0,0,cavity_z]) cylinder(d=entry_d,h=body_h,$fn=48);
    // Flex slit opens away from the arm and permits controlled ball insertion.
    translate([-1.0,-outer_d/2-EPS,cavity_z])
      cube([2.0,outer_d/2+EPS,body_h-cavity_z+EPS]);
  }
}

// Short, support-free arm. The 6 mm eye fits the slider fork; the three-value
// coupon below must select the production socket clearance for the local PETG.
module camera_short_socket_arm(clearance=CAMERA_BALL_CLEARANCE) {
  eye=[10,13];
  socket=[80,13];
  eye_t=CAMERA_ARM_EYE_T;
  difference() {
    union() {
      hull() {
        translate([eye[0],eye[1],0]) cylinder(d=20,h=eye_t,$fn=56);
        translate([socket[0],socket[1],0]) cylinder(d=20,h=eye_t,$fn=56);
      }
      translate([socket[0],socket[1],0]) camera_socket_body(clearance);
    }
    translate([eye[0],eye[1],-EPS])
      cylinder(d=CAMERA_HINGE_D,h=eye_t+2*EPS,$fn=40);
  }
}

module camera_ball_test_pin() {
  union() {
    rounded_prism([26,26,3],3);
    translate([13,13,3-EPS]) cylinder(d=5,h=7,$fn=48);
    translate([13,13,9]) sphere(d=CAMERA_BALL_D,$fn=72);
  }
}

// One connected coupon, left to right: 0.15 / 0.28 / 0.40 mm radial clearance.
module camera_ball_socket_coupon() {
  clearances=[0.15,0.28,0.40];
  difference() {
    union() {
      rounded_prism([82,30,2],3);
      for (i=[0:2])
        translate([15+26*i,15,0]) camera_socket_body(clearances[i]);
      for (i=[0:2],p=[0:i])
        translate([11+26*i+3*p,3,2]) cylinder(d=2.2,h=1.2,$fn=24);
    }
  }
}

module camera_window_inner_bezel() {
  outer_w=CAMERA_WINDOW_W+16;
  outer_h=CAMERA_WINDOW_H+16;
  opening_w=CAMERA_WINDOW_W-8;
  opening_h=CAMERA_WINDOW_H-8;
  difference() {
    rounded_prism([outer_w,outer_h,3],4);
    translate([(outer_w-opening_w)/2,(outer_h-opening_h)/2,-EPS])
      rounded_prism([opening_w,opening_h,3+2*EPS],2.5);
    for (x=[7,outer_w-7],y=[7,outer_h-7])
      translate([x,y,-EPS]) cylinder(d=4.5,h=3+2*EPS,$fn=32);
  }
}

// Wedge thickness varies across X to tilt the clear optical pane by 7 degrees.
module camera_window_outer_wedge() {
  outer_w=CAMERA_WINDOW_W+16;
  outer_h=CAMERA_WINDOW_H+16;
  frame=8;
  z0=3.0;
  dz=tan(CAMERA_WINDOW_TILT)*outer_w;

  module wedge_bar(x0,y0,x1,y1) {
    polyhedron(
      points=[
        [x0,y0,0],[x1,y0,0],[x1,y1,0],[x0,y1,0],
        [x0,y0,z0+dz*x0/outer_w],[x1,y0,z0+dz*x1/outer_w],
        [x1,y1,z0+dz*x1/outer_w],[x0,y1,z0+dz*x0/outer_w]
      ],
      faces=[[0,3,2,1],[4,5,6,7],[0,1,5,4],[1,2,6,5],
             [2,3,7,6],[3,0,4,7]],convexity=4);
  }

  assert(CAMERA_WINDOW_TILT>=4 && CAMERA_WINDOW_TILT<=10,
    "Optical window tilt must remain between 4 and 10 degrees");
  difference() {
    union() {
      wedge_bar(0,0,outer_w,frame);
      wedge_bar(0,outer_h-frame,outer_w,outer_h);
      wedge_bar(0,frame,frame,outer_h-frame);
      wedge_bar(outer_w-frame,frame,outer_w,outer_h-frame);
    }
    for (x=[7,outer_w-7],y=[7,outer_h-7])
      translate([x,y,-EPS]) cylinder(d=4.8,h=z0+dz+2*EPS,$fn=32);
  }
}

module camera_window_clamp_frame() {
  outer_w=CAMERA_WINDOW_W+16;
  outer_h=CAMERA_WINDOW_H+16;
  difference() {
    rounded_prism([outer_w,outer_h,2.5],4);
    translate([8,8,-EPS])
      rounded_prism([outer_w-16,outer_h-16,2.5+2*EPS],2.5);
    for (x=[7,outer_w-7],y=[7,outer_h-7])
      translate([x,y,-EPS]) cylinder(d=5.2,h=2.5+2*EPS,$fn=32);
  }
}

// Optional screw-on clip for common 17 x 8 mm aluminium LED profiles.
module led_profile_clip_17x8() {
  difference() {
    union() {
      rounded_prism([31,18,3],3);
      translate([5,3,3]) cube([2.4,12,8]);
      translate([23.6,3,3]) cube([2.4,12,8]);
      translate([5,3,9]) cube([4.2,12,2]);
      translate([21.8,3,9]) cube([4.2,12,2]);
    }
    translate([15.5,9,-EPS]) cylinder(d=4.3,h=3+2*EPS,$fn=32);
  }
}

module render_selected_part() {
  if (PART=="rail_286") acrylic_rail(286,true);
  else if (PART=="rail_143") acrylic_rail(143,true);
  else if (PART=="rail_test_coupon") rail_test_coupon();
  else if (PART=="rail_splice_pin") rail_splice_pin(30);
  else if (PART=="rail_end_stop") translate([RAIL_T,0,0]) rotate([0,-90,0]) rail_end_stop();
  else if (PART=="corner_gusset_3way") corner_gusset_3way();
  else if (PART=="flat_t_bracket") flat_t_bracket();
  else if (PART=="base_anchor") base_anchor();
  else if (PART=="turn_clip") turn_clip();
  else if (PART=="turn_clip_spacer") turn_clip_spacer();
  else if (PART=="panel_knob") panel_knob();
  else if (PART=="panel_retainer_clip") panel_retainer_clip();
  else if (PART=="front_panel_shelf") front_panel_shelf();
  else if (PART=="service_panel_120_ports") service_panel_120_ports();
  else if (PART=="service_panel_blank") service_panel_blank();
  else if (PART=="fan_adapter_120_to_100") fan_adapter_120_to_100();
  else if (PART=="fan_guard_120") fan_guard_120();
  else if (PART=="cable_grommet_half_A") cable_grommet_half(1);
  else if (PART=="cable_grommet_half_B") cable_grommet_half(-1);
  else if (PART=="camera_2020_slider_fork") camera_2020_slider_fork();
  else if (PART=="camera_fork_fit_coupon") camera_fork_fit_coupon();
  else if (PART=="camera_fit_frame_coupon") camera_fit_frame_coupon();
  else if (PART=="camera_front_shell") camera_front_shell();
  else if (PART=="camera_back_cover_ball") camera_back_cover_ball();
  else if (PART=="camera_short_socket_arm") camera_short_socket_arm();
  else if (PART=="camera_ball_test_pin") camera_ball_test_pin();
  else if (PART=="camera_ball_socket_coupon") camera_ball_socket_coupon();
  else if (PART=="camera_window_inner_bezel") camera_window_inner_bezel();
  else if (PART=="camera_window_outer_wedge") camera_window_outer_wedge();
  else if (PART=="camera_window_clamp_frame") camera_window_clamp_frame();
  else if (PART=="led_profile_clip_17x8") led_profile_clip_17x8();
  else if (PART=="roof_cassette_corner_locator") roof_cassette_corner_locator();
  else if (PART=="exhaust_camera_baffle_120") exhaust_camera_baffle_120();
  else rail_test_coupon();
}

if (is_undef(LIBRARY_MODE) ? true : !LIBRARY_MODE) render_selected_part();
